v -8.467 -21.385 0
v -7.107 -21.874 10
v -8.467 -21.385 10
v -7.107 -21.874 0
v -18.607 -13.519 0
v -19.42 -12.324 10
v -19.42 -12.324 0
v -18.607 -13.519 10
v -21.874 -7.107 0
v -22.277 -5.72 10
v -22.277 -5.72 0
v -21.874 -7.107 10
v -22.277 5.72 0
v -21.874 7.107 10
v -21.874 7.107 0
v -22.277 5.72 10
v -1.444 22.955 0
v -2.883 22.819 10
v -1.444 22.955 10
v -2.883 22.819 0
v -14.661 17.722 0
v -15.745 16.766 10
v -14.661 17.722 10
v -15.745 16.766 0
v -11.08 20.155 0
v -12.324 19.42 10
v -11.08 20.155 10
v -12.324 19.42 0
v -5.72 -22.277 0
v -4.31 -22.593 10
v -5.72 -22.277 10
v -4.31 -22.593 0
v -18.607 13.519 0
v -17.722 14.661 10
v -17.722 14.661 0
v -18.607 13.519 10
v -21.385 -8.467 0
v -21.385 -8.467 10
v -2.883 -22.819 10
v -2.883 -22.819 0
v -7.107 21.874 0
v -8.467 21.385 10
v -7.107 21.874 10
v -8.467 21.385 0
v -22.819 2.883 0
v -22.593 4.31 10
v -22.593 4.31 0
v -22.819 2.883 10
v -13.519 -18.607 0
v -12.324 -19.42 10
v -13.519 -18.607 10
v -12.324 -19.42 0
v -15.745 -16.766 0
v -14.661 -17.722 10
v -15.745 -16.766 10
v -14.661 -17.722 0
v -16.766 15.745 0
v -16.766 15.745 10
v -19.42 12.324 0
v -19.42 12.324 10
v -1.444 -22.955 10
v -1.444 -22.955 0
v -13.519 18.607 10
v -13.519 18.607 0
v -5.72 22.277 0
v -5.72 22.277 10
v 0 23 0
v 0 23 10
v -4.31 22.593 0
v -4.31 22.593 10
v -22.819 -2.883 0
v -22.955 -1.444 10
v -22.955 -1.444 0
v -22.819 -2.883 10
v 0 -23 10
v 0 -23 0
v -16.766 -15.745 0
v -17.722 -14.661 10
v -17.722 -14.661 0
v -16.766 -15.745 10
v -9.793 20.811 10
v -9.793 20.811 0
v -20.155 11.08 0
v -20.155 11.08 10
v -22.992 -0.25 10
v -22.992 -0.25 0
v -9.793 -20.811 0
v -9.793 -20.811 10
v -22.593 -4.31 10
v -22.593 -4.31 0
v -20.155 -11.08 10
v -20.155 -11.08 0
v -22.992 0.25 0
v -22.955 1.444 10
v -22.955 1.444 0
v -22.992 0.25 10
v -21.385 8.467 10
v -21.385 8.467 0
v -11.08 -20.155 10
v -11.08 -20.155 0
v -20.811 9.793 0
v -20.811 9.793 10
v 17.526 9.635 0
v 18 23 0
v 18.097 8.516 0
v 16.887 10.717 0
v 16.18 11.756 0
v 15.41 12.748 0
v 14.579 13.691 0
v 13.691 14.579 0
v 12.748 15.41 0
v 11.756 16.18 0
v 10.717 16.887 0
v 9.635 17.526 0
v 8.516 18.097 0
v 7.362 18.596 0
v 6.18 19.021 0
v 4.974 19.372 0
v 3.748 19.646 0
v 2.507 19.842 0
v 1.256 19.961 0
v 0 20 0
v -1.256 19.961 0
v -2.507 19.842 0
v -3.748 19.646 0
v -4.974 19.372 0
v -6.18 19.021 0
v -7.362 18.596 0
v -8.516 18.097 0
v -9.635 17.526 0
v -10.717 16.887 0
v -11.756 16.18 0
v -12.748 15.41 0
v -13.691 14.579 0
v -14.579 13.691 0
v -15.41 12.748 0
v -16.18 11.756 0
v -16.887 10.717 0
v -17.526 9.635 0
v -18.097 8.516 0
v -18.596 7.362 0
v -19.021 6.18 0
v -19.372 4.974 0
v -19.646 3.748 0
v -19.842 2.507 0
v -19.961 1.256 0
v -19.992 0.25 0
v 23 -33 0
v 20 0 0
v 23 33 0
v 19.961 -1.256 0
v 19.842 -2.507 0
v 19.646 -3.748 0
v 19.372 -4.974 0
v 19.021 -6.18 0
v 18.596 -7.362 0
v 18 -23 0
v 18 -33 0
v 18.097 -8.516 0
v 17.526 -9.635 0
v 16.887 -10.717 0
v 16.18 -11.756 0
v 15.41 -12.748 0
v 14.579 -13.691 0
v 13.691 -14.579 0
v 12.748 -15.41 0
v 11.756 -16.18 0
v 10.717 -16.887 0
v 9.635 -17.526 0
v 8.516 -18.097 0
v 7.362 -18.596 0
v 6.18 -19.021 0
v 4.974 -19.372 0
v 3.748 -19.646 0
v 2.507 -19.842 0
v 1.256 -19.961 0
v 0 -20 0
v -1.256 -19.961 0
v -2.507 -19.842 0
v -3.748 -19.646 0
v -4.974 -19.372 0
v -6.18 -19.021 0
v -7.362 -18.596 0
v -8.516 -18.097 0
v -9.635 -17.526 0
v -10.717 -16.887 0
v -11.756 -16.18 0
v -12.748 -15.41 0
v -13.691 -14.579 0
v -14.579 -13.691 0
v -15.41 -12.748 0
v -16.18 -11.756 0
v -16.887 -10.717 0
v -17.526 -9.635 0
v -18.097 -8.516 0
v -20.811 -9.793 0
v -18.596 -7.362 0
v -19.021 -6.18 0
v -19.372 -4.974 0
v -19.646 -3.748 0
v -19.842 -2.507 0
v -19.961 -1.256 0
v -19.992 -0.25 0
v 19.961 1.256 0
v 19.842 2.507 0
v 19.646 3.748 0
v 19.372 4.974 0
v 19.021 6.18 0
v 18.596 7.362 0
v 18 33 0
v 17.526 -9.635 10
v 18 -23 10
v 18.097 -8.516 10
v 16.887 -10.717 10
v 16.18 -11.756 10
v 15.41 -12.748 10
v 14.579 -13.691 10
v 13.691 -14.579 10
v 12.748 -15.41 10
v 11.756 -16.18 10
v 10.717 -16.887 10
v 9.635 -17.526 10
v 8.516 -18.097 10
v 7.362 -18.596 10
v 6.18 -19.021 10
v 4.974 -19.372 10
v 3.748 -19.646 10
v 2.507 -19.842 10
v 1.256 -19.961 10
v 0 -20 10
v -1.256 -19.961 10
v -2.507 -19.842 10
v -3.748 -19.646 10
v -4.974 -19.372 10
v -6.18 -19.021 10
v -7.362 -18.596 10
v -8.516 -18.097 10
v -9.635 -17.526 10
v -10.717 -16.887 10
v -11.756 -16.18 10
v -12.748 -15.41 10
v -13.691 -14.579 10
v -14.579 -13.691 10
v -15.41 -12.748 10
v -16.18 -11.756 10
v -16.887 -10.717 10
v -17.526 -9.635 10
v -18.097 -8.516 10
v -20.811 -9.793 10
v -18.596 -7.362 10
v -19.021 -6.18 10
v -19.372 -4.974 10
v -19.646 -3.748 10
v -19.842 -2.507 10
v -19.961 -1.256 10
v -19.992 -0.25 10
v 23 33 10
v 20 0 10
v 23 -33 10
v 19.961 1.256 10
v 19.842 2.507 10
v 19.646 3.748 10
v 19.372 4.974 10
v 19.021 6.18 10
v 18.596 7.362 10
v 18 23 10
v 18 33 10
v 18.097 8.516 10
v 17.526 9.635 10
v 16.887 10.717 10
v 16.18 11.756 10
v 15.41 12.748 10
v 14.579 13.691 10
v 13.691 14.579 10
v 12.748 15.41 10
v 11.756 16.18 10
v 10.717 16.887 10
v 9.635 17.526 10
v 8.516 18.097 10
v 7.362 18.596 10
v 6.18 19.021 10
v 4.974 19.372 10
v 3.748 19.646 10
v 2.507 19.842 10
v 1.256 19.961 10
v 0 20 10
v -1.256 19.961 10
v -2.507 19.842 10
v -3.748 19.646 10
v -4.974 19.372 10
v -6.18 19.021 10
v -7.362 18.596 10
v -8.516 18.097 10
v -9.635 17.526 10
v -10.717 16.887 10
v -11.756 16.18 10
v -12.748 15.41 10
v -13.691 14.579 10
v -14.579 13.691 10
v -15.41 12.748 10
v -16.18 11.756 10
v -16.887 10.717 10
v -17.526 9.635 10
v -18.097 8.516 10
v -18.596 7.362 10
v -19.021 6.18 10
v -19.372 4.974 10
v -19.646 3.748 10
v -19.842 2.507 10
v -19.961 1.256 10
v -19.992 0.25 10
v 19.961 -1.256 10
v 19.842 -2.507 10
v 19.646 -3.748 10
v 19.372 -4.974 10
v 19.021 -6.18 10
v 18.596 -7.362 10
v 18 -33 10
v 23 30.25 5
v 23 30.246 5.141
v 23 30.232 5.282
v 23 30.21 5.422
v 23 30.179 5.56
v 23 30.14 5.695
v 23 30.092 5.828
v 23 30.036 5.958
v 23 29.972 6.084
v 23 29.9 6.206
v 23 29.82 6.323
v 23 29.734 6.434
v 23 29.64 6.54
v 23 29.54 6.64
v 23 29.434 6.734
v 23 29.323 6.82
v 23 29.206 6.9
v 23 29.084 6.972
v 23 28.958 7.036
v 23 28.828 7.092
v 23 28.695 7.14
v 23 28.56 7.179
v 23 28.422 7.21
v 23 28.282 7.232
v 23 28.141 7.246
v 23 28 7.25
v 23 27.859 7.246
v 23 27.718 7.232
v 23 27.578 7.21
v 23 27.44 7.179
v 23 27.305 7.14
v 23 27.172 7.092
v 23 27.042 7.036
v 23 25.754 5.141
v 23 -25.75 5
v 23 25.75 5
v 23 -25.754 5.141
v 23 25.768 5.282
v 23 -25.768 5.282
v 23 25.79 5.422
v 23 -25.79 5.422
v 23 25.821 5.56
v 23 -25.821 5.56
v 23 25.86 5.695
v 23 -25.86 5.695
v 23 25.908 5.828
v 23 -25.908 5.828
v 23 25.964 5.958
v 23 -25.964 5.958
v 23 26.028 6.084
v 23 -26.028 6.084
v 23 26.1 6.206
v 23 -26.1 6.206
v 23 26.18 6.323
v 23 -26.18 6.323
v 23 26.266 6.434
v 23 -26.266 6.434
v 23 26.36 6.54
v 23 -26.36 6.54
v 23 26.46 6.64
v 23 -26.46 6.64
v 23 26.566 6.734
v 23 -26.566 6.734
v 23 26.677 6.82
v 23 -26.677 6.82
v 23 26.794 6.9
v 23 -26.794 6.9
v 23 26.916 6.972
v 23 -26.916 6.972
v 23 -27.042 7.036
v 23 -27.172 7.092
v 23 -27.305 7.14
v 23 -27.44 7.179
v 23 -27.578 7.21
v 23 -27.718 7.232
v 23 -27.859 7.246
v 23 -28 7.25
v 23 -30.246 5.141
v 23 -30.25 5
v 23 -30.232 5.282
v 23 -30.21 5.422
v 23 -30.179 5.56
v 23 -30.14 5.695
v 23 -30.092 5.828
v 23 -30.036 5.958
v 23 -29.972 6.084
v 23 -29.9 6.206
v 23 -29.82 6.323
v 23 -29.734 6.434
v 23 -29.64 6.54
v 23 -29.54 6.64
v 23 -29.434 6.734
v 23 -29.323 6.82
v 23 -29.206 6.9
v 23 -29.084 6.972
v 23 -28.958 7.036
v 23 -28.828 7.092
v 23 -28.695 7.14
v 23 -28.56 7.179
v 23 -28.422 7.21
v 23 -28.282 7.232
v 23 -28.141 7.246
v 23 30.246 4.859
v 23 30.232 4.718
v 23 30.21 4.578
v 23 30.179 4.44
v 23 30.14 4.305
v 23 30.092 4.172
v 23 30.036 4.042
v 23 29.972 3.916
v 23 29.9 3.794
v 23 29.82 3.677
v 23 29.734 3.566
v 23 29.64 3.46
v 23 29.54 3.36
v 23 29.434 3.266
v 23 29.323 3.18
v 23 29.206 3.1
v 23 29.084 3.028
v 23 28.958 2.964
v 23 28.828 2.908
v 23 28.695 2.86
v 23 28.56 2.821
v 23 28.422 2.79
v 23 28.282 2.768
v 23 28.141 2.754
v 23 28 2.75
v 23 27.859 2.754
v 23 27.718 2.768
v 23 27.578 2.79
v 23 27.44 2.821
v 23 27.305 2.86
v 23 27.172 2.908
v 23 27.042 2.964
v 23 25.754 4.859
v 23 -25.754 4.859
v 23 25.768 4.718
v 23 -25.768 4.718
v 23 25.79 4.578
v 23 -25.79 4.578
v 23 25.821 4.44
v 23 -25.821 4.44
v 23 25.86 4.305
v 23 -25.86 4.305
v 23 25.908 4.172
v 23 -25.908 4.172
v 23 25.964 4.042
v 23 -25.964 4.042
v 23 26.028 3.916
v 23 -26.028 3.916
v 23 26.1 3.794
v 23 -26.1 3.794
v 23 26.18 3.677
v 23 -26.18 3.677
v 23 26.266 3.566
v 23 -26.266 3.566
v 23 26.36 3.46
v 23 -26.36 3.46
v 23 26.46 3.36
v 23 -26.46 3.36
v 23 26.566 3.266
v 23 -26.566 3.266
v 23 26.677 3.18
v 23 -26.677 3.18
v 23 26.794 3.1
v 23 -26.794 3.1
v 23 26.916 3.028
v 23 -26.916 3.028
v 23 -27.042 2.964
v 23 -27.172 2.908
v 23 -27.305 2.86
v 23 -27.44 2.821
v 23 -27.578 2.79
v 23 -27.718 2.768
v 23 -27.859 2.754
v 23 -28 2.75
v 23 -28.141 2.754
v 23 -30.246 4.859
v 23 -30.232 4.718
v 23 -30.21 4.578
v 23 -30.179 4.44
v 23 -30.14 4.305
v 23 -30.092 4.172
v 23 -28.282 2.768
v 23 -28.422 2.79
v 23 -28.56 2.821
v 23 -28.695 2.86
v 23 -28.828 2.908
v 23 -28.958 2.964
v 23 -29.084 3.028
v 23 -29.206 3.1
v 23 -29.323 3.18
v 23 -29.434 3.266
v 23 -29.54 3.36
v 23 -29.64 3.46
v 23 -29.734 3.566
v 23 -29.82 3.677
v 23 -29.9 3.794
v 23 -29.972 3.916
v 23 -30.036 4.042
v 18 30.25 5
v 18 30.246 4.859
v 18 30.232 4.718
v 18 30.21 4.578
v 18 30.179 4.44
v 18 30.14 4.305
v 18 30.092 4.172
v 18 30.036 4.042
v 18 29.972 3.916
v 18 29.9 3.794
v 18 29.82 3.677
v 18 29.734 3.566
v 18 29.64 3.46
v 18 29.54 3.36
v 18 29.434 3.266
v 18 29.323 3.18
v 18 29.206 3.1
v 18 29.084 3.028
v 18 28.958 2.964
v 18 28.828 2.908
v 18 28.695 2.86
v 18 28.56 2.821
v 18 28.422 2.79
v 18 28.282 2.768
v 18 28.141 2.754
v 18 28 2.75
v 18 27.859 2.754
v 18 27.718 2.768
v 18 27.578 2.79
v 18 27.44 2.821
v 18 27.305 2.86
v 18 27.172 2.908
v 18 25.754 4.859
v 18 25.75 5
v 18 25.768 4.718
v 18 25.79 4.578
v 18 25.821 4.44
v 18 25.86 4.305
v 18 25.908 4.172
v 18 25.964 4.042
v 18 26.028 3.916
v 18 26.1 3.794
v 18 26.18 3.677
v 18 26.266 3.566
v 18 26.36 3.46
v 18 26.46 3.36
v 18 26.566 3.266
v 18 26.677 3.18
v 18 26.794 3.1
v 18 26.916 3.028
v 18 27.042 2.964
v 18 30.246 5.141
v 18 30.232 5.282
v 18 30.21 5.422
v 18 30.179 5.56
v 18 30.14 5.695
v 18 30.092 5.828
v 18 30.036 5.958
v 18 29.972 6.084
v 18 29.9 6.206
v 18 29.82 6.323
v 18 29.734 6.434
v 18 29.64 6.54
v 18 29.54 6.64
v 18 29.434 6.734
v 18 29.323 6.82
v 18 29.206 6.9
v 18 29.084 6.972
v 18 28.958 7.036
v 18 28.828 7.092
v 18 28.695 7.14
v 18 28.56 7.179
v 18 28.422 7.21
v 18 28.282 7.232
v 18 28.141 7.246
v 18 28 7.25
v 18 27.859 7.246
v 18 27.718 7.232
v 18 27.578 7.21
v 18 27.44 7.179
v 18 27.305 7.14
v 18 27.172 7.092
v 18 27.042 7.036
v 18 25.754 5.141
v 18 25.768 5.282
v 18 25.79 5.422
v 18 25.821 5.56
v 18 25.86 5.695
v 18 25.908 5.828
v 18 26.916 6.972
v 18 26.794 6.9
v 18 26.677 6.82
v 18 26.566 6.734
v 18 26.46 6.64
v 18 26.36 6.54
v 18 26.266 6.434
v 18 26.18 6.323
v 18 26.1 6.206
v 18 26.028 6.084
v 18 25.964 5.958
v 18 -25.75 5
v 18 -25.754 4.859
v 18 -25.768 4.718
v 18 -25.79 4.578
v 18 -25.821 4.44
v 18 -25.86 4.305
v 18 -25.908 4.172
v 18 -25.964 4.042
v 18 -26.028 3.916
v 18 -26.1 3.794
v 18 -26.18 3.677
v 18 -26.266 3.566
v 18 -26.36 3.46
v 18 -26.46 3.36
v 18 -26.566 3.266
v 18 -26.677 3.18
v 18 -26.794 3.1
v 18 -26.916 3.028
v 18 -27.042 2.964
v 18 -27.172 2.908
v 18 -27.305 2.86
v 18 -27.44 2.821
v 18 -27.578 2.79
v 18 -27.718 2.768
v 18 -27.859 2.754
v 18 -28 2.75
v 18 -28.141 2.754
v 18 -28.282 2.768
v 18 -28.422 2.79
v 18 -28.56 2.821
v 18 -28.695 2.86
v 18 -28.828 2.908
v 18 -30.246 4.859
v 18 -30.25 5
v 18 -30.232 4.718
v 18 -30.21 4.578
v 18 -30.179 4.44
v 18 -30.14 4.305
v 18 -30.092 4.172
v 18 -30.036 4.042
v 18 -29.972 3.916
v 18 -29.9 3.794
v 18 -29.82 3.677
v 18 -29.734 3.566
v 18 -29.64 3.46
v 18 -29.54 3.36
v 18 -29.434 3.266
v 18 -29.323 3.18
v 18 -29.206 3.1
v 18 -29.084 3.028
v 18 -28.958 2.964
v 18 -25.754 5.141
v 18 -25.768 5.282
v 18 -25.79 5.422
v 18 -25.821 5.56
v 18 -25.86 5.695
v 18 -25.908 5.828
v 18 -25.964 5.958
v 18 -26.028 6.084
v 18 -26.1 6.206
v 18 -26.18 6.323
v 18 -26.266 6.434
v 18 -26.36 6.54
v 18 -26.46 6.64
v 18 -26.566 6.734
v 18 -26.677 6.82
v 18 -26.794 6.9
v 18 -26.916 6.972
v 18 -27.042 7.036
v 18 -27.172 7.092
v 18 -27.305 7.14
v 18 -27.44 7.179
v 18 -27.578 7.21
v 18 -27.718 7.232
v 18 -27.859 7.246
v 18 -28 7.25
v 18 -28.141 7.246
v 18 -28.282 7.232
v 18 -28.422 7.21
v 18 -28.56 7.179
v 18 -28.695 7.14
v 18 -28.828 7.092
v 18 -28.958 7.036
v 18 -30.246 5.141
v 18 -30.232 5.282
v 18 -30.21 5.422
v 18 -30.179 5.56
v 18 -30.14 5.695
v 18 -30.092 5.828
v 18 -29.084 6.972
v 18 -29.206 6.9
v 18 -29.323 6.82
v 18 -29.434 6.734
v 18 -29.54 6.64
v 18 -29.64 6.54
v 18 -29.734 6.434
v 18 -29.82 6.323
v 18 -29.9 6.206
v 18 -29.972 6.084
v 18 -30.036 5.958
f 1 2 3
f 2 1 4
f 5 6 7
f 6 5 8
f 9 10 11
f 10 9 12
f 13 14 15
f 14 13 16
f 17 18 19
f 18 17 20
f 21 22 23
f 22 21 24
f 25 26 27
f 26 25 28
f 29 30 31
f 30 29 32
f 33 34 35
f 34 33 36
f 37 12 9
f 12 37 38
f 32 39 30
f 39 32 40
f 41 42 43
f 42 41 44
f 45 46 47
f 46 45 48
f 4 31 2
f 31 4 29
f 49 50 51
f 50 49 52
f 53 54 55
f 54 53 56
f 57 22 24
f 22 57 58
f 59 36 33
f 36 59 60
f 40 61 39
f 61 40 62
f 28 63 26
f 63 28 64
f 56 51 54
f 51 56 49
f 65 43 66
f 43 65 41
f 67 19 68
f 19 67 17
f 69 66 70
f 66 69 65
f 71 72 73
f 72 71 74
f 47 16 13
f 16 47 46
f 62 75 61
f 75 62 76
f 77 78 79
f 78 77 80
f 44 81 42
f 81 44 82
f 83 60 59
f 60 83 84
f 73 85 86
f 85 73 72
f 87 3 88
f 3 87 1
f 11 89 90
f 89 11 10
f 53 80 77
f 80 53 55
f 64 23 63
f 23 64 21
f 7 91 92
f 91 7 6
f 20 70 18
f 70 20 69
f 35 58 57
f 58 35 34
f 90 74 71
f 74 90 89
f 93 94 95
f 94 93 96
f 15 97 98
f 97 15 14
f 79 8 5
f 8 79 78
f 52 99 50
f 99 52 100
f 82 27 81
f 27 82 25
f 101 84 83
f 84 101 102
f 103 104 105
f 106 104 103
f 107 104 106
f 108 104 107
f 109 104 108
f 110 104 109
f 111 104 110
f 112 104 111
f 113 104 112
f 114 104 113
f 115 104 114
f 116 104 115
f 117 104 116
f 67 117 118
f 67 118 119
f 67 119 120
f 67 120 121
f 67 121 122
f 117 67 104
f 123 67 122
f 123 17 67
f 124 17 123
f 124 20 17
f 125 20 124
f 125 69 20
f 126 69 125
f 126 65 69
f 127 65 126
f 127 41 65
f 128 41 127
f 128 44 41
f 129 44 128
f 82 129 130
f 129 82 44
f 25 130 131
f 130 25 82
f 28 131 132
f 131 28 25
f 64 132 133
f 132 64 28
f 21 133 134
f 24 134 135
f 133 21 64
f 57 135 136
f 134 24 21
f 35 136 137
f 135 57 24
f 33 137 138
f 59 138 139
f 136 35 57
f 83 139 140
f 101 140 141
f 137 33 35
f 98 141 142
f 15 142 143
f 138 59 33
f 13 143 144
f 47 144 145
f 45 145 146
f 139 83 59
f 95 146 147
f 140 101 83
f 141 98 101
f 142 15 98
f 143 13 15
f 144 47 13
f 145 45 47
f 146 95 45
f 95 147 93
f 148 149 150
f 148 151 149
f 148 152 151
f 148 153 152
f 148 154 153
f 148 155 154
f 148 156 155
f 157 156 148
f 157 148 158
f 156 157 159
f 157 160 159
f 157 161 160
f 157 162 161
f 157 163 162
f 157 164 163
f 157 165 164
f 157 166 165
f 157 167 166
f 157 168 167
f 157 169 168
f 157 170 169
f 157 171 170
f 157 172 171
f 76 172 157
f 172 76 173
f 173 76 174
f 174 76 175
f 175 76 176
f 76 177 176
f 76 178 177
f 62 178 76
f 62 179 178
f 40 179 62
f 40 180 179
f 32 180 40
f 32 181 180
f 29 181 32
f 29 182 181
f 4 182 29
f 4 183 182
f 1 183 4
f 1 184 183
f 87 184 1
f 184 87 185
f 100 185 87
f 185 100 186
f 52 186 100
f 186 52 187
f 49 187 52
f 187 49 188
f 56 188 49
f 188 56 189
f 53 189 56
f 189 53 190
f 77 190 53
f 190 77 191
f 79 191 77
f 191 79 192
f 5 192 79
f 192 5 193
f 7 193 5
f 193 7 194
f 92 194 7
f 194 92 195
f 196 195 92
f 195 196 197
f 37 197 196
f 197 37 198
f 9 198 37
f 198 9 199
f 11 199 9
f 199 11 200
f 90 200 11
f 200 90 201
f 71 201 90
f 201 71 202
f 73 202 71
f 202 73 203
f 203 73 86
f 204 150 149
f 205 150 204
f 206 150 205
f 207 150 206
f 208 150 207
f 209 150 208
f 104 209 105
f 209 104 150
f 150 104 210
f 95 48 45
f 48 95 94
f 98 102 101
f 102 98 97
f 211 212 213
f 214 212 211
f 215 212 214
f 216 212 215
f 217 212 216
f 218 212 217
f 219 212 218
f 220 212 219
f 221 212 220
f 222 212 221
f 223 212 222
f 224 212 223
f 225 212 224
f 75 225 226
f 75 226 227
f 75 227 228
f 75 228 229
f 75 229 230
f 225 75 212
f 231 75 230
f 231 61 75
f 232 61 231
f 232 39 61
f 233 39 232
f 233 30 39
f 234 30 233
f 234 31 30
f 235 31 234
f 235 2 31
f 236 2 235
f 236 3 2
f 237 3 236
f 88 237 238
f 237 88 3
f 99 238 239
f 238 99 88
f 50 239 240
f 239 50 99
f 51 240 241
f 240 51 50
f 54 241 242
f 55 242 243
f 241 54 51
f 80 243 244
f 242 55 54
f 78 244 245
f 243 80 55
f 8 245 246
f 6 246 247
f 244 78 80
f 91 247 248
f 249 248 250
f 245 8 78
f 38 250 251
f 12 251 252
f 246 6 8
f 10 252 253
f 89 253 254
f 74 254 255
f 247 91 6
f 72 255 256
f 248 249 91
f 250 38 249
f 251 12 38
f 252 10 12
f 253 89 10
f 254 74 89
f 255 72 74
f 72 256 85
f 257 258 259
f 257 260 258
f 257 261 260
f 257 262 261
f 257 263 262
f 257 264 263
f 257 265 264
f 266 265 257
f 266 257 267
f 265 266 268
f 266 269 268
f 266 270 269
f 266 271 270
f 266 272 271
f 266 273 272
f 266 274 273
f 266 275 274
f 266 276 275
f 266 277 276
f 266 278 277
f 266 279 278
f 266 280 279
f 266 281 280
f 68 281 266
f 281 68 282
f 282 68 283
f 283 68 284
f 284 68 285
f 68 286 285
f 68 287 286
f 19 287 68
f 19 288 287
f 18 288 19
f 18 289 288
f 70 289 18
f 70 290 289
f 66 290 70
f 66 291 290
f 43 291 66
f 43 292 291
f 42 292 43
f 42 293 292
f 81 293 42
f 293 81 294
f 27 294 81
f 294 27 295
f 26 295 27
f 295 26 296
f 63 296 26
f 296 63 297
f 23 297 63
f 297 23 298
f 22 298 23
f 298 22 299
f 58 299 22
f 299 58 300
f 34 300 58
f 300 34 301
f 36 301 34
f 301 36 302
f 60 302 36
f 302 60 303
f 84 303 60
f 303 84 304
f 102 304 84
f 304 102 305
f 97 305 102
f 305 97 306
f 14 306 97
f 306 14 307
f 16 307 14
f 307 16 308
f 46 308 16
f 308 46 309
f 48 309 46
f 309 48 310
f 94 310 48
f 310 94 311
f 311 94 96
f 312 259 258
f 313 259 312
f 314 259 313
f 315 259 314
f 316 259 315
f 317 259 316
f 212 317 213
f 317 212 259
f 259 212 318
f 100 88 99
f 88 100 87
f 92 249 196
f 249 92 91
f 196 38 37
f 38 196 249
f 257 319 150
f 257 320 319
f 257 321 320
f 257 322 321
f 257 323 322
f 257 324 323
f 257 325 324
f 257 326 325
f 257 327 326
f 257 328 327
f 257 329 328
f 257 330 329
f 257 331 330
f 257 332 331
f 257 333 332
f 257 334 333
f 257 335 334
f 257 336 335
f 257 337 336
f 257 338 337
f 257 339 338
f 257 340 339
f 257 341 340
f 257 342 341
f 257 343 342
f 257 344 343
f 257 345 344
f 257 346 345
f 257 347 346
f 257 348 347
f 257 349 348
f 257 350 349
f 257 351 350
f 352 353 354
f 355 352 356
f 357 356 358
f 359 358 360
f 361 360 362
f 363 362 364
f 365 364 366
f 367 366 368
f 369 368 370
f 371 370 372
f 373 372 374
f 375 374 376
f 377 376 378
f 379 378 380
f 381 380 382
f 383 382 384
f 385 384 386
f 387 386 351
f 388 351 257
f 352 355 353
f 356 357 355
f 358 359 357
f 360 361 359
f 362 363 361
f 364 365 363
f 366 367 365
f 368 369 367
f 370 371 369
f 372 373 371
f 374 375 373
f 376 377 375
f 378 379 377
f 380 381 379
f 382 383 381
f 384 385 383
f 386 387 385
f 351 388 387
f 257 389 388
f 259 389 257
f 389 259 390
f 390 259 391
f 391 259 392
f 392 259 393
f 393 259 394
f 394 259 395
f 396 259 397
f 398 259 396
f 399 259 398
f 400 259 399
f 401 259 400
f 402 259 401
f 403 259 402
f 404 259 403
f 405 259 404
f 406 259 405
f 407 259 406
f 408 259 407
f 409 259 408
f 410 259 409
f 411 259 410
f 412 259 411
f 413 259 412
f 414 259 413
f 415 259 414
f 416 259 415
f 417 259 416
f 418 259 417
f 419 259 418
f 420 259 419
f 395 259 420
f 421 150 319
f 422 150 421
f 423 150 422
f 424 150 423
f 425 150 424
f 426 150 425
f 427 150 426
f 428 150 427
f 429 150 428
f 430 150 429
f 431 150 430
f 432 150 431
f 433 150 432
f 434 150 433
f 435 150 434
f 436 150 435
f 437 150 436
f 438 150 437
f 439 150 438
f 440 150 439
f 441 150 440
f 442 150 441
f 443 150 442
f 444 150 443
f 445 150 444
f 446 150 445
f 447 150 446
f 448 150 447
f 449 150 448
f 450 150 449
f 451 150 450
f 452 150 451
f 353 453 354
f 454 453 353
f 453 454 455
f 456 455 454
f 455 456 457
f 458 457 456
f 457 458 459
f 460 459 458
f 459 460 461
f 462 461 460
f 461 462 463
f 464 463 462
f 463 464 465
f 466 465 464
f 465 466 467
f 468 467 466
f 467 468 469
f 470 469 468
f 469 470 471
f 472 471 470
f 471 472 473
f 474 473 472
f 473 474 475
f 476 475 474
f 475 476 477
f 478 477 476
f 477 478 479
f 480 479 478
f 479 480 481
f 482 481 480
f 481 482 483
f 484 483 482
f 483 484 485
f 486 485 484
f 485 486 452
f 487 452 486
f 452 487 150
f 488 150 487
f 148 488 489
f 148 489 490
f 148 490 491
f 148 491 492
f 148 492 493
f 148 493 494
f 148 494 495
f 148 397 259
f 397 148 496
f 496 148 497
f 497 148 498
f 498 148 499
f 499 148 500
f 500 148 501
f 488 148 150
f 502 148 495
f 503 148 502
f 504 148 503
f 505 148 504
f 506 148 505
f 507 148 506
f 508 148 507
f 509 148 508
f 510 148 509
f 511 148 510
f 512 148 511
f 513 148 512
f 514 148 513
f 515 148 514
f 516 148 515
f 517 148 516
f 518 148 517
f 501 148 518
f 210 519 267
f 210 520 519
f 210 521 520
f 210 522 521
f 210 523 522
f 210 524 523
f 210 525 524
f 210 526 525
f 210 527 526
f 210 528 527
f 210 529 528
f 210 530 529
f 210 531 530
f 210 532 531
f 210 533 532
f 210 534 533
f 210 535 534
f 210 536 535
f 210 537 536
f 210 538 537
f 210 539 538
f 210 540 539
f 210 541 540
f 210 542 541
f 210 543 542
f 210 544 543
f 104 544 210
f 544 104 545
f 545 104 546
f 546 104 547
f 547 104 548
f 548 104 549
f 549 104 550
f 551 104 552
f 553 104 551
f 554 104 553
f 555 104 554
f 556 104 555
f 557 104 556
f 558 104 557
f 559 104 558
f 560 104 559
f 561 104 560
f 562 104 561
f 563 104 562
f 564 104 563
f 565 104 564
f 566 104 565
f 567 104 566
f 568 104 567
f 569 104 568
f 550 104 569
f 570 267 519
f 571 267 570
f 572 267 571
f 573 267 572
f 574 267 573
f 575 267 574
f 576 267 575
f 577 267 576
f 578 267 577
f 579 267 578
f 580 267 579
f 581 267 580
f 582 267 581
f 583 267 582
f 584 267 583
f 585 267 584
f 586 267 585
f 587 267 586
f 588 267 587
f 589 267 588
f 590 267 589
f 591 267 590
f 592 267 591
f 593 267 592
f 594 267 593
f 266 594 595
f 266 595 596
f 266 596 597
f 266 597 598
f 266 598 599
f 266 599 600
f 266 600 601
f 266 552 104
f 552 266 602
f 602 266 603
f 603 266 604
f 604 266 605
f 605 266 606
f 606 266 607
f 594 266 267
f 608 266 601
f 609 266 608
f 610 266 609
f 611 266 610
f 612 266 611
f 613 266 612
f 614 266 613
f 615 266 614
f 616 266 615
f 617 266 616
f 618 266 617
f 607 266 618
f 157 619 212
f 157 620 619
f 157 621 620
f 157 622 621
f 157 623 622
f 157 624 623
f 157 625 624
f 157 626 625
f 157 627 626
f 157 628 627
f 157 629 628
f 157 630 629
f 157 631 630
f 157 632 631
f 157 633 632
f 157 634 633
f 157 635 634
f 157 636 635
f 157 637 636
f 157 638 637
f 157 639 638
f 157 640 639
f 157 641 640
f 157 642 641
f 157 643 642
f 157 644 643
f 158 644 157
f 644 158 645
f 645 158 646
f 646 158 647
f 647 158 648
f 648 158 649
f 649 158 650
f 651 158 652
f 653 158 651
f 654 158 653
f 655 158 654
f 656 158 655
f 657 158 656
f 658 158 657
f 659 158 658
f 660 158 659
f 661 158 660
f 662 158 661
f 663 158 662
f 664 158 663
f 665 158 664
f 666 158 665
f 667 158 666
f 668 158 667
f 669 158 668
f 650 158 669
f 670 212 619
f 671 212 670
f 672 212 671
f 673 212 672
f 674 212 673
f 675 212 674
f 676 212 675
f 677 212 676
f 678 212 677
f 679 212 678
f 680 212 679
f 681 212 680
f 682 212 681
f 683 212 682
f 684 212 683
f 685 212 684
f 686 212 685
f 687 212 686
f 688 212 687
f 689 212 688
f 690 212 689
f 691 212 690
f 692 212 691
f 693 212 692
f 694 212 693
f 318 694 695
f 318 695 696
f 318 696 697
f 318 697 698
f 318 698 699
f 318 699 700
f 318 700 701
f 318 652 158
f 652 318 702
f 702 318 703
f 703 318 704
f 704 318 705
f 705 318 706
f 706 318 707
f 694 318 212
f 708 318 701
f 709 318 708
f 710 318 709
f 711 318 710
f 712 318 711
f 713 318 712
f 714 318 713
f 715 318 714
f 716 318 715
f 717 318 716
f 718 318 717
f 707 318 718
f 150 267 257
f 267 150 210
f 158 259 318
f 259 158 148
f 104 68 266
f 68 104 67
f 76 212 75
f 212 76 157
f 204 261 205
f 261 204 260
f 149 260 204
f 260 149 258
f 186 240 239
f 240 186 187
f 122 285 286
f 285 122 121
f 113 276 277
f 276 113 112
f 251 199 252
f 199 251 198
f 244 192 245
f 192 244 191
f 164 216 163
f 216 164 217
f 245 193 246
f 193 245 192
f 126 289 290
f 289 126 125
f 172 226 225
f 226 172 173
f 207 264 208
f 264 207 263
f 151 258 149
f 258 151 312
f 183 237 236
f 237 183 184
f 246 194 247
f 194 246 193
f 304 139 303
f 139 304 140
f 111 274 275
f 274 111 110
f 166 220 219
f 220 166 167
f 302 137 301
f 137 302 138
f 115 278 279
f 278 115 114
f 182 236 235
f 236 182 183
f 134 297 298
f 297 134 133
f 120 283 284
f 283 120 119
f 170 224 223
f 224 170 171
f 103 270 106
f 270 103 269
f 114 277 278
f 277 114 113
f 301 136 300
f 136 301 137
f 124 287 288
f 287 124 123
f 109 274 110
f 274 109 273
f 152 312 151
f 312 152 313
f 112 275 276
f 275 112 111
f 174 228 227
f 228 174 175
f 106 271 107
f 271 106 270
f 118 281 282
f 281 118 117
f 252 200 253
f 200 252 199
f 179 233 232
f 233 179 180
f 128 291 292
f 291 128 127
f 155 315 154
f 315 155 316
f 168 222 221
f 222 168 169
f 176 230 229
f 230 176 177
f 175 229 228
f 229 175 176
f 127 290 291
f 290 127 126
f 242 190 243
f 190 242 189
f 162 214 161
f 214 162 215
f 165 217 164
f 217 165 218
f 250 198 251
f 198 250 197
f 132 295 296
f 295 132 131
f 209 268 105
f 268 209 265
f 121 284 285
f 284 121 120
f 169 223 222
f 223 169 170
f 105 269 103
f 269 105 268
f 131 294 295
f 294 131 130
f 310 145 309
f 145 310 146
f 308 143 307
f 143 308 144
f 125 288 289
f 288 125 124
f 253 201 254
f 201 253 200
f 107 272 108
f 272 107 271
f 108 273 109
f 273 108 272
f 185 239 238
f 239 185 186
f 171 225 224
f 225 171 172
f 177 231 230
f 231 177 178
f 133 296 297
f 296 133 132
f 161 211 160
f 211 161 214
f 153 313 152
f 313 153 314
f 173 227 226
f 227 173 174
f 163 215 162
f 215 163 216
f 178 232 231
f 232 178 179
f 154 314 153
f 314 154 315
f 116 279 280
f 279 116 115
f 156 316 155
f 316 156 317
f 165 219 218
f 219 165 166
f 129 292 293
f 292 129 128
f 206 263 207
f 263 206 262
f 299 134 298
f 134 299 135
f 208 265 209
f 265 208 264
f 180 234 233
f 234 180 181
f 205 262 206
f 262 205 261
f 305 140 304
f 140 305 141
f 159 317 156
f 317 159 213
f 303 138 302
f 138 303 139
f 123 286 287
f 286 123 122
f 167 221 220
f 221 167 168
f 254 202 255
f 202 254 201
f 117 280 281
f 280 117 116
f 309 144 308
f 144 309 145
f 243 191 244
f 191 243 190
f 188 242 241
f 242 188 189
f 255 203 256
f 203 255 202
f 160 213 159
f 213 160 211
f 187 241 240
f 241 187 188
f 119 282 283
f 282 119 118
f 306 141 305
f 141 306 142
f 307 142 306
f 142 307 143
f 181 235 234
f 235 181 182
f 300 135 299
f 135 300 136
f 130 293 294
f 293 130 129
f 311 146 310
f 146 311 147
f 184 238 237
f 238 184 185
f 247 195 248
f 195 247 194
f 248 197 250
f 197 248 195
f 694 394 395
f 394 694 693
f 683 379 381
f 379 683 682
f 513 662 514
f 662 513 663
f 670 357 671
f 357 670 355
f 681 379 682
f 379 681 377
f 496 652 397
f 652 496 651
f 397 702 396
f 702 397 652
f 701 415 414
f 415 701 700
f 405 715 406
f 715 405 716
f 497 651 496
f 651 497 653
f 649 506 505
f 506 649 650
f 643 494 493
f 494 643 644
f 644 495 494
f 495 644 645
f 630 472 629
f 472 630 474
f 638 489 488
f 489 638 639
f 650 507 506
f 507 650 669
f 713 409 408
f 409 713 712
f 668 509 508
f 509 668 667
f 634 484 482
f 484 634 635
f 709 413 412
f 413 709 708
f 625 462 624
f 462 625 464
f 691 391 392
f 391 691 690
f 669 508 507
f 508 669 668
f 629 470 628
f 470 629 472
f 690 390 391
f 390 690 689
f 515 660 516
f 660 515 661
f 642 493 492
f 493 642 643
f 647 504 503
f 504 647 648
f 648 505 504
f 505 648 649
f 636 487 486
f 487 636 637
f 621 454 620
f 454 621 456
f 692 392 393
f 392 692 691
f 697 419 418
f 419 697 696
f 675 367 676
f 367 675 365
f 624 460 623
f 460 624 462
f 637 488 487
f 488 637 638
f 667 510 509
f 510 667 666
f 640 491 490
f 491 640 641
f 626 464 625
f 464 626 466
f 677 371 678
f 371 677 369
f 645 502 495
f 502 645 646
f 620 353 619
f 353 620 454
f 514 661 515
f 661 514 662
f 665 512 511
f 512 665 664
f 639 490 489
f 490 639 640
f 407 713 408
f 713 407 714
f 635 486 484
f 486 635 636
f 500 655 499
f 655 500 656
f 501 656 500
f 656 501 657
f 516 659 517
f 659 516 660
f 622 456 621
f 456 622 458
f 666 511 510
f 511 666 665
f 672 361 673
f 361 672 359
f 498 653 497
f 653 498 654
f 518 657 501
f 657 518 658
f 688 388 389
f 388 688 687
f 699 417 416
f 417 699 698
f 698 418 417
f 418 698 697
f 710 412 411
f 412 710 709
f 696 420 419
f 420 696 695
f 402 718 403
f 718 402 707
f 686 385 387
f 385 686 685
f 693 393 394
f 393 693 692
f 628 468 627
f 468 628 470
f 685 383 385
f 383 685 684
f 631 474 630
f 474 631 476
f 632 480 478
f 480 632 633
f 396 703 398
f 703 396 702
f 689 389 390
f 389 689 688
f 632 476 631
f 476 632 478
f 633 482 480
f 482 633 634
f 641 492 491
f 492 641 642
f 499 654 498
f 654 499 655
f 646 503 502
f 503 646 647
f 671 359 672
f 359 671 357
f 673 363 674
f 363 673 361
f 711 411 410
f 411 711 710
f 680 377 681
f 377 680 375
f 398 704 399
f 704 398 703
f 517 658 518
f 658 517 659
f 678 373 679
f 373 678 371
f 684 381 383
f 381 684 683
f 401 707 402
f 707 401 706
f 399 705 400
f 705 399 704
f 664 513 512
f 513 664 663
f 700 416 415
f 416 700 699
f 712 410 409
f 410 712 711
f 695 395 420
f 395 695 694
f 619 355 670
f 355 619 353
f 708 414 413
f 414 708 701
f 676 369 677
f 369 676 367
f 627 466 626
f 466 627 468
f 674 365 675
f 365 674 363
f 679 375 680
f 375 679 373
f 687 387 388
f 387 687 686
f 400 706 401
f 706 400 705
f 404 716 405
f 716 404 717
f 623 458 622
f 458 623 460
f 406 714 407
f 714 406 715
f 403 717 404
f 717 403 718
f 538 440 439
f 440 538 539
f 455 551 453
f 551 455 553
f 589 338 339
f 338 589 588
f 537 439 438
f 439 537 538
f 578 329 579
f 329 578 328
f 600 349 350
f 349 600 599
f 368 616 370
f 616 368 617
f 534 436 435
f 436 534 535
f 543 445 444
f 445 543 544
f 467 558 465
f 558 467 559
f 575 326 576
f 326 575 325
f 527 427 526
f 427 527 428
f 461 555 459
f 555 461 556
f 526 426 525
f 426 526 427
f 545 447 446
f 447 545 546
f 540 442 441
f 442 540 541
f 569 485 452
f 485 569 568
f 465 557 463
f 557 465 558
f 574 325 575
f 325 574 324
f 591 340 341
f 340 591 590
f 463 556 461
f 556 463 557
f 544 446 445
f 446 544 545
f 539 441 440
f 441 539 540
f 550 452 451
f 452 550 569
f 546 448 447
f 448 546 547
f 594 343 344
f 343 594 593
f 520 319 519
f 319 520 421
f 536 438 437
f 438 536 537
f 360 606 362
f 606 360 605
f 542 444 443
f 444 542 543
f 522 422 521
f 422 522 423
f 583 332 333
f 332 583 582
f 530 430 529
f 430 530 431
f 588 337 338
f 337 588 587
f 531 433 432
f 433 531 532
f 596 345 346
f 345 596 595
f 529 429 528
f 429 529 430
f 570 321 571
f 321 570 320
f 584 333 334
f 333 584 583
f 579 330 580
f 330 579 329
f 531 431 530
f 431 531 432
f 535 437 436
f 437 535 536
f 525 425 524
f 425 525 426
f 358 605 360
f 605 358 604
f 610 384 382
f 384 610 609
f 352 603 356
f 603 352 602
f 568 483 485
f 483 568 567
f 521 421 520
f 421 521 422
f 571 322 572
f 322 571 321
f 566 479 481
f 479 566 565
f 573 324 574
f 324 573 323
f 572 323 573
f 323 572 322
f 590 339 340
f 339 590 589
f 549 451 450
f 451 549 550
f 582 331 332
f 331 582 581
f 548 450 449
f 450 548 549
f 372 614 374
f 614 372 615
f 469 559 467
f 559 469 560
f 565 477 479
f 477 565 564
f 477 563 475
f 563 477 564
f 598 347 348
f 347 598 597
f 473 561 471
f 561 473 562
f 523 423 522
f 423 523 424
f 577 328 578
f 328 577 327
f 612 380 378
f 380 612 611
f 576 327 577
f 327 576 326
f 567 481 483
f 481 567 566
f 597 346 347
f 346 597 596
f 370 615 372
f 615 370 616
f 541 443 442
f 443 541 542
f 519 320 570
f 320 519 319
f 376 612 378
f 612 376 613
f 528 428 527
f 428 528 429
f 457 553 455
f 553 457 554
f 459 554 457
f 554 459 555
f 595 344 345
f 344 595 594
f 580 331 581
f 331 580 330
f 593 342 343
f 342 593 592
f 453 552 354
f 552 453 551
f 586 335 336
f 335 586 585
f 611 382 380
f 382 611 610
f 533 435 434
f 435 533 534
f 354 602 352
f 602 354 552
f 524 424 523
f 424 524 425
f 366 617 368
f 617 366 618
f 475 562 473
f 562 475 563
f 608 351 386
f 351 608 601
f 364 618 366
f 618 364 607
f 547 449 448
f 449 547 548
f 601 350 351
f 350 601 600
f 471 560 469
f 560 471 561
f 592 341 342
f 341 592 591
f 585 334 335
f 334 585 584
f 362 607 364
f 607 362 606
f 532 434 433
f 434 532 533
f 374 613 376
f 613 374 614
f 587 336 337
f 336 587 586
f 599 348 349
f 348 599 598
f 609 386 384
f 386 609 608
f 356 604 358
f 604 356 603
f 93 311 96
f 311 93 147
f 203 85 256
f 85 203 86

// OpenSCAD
//Cable organizer
//John Finch 2-6-14

inner_dia=40; 		//large inner hole
wall=3;  			//wall thickness of loop
tab_length=10; 		//mounting tab length
tab_thickness=5;		//mounting tab thickness
clip_width=10; 		//height of loop along Z axis
mount_hole_dia=4.5;	//screw hole diameter
opening=1;			//1 for a gap in loop, 0 for a solid loop
opening_width=.5;	//opening width if enabled


fn=100;


difference(){

	union(){
  	//place outer ring
	cylinder(h=clip_width,r1=inner_dia/2+wall,r2=inner_dia/2+wall,$fn=fn);

	//place mounting tabs
	translate([inner_dia/2+wall-tab_thickness,-(inner_dia+2*wall+2*tab_length)/2,0])
	cube([tab_thickness,inner_dia+2*wall+2*tab_length,clip_width]);

	//place lower cube
	translate([0,-inner_dia/2-wall,0])
	cube([inner_dia/2+wall,inner_dia+2*wall,clip_width]);
	}

//cut inner hole
cylinder(h=clip_width,r1=inner_dia/2,r2=inner_dia/2,$fn=fn);

//cut hole in mounting tab 1
translate([inner_dia/2+wall-tab_thickness*1.01,-(inner_dia/2+wall+tab_length/2),clip_width/2])
rotate([0,90,0])
cylinder(h=tab_thickness*1.05,r1=mount_hole_dia/2,r2=mount_hole_dia/2,$fn=fn);

//cut hole in mounting tab 2
translate([inner_dia/2+wall-tab_thickness*1.01,(inner_dia/2+wall+tab_length/2),clip_width/2])
rotate([0,90,0])
cylinder(h=tab_thickness*1.05,r1=mount_hole_dia/2,r2=mount_hole_dia/2,$fn=fn);

//slice ring
if (opening == 1)
	{
	translate([-(inner_dia/2+wall),-opening_width/2,0])
	cube([inner_dia/2,opening_width,clip_width]);
	}
}
